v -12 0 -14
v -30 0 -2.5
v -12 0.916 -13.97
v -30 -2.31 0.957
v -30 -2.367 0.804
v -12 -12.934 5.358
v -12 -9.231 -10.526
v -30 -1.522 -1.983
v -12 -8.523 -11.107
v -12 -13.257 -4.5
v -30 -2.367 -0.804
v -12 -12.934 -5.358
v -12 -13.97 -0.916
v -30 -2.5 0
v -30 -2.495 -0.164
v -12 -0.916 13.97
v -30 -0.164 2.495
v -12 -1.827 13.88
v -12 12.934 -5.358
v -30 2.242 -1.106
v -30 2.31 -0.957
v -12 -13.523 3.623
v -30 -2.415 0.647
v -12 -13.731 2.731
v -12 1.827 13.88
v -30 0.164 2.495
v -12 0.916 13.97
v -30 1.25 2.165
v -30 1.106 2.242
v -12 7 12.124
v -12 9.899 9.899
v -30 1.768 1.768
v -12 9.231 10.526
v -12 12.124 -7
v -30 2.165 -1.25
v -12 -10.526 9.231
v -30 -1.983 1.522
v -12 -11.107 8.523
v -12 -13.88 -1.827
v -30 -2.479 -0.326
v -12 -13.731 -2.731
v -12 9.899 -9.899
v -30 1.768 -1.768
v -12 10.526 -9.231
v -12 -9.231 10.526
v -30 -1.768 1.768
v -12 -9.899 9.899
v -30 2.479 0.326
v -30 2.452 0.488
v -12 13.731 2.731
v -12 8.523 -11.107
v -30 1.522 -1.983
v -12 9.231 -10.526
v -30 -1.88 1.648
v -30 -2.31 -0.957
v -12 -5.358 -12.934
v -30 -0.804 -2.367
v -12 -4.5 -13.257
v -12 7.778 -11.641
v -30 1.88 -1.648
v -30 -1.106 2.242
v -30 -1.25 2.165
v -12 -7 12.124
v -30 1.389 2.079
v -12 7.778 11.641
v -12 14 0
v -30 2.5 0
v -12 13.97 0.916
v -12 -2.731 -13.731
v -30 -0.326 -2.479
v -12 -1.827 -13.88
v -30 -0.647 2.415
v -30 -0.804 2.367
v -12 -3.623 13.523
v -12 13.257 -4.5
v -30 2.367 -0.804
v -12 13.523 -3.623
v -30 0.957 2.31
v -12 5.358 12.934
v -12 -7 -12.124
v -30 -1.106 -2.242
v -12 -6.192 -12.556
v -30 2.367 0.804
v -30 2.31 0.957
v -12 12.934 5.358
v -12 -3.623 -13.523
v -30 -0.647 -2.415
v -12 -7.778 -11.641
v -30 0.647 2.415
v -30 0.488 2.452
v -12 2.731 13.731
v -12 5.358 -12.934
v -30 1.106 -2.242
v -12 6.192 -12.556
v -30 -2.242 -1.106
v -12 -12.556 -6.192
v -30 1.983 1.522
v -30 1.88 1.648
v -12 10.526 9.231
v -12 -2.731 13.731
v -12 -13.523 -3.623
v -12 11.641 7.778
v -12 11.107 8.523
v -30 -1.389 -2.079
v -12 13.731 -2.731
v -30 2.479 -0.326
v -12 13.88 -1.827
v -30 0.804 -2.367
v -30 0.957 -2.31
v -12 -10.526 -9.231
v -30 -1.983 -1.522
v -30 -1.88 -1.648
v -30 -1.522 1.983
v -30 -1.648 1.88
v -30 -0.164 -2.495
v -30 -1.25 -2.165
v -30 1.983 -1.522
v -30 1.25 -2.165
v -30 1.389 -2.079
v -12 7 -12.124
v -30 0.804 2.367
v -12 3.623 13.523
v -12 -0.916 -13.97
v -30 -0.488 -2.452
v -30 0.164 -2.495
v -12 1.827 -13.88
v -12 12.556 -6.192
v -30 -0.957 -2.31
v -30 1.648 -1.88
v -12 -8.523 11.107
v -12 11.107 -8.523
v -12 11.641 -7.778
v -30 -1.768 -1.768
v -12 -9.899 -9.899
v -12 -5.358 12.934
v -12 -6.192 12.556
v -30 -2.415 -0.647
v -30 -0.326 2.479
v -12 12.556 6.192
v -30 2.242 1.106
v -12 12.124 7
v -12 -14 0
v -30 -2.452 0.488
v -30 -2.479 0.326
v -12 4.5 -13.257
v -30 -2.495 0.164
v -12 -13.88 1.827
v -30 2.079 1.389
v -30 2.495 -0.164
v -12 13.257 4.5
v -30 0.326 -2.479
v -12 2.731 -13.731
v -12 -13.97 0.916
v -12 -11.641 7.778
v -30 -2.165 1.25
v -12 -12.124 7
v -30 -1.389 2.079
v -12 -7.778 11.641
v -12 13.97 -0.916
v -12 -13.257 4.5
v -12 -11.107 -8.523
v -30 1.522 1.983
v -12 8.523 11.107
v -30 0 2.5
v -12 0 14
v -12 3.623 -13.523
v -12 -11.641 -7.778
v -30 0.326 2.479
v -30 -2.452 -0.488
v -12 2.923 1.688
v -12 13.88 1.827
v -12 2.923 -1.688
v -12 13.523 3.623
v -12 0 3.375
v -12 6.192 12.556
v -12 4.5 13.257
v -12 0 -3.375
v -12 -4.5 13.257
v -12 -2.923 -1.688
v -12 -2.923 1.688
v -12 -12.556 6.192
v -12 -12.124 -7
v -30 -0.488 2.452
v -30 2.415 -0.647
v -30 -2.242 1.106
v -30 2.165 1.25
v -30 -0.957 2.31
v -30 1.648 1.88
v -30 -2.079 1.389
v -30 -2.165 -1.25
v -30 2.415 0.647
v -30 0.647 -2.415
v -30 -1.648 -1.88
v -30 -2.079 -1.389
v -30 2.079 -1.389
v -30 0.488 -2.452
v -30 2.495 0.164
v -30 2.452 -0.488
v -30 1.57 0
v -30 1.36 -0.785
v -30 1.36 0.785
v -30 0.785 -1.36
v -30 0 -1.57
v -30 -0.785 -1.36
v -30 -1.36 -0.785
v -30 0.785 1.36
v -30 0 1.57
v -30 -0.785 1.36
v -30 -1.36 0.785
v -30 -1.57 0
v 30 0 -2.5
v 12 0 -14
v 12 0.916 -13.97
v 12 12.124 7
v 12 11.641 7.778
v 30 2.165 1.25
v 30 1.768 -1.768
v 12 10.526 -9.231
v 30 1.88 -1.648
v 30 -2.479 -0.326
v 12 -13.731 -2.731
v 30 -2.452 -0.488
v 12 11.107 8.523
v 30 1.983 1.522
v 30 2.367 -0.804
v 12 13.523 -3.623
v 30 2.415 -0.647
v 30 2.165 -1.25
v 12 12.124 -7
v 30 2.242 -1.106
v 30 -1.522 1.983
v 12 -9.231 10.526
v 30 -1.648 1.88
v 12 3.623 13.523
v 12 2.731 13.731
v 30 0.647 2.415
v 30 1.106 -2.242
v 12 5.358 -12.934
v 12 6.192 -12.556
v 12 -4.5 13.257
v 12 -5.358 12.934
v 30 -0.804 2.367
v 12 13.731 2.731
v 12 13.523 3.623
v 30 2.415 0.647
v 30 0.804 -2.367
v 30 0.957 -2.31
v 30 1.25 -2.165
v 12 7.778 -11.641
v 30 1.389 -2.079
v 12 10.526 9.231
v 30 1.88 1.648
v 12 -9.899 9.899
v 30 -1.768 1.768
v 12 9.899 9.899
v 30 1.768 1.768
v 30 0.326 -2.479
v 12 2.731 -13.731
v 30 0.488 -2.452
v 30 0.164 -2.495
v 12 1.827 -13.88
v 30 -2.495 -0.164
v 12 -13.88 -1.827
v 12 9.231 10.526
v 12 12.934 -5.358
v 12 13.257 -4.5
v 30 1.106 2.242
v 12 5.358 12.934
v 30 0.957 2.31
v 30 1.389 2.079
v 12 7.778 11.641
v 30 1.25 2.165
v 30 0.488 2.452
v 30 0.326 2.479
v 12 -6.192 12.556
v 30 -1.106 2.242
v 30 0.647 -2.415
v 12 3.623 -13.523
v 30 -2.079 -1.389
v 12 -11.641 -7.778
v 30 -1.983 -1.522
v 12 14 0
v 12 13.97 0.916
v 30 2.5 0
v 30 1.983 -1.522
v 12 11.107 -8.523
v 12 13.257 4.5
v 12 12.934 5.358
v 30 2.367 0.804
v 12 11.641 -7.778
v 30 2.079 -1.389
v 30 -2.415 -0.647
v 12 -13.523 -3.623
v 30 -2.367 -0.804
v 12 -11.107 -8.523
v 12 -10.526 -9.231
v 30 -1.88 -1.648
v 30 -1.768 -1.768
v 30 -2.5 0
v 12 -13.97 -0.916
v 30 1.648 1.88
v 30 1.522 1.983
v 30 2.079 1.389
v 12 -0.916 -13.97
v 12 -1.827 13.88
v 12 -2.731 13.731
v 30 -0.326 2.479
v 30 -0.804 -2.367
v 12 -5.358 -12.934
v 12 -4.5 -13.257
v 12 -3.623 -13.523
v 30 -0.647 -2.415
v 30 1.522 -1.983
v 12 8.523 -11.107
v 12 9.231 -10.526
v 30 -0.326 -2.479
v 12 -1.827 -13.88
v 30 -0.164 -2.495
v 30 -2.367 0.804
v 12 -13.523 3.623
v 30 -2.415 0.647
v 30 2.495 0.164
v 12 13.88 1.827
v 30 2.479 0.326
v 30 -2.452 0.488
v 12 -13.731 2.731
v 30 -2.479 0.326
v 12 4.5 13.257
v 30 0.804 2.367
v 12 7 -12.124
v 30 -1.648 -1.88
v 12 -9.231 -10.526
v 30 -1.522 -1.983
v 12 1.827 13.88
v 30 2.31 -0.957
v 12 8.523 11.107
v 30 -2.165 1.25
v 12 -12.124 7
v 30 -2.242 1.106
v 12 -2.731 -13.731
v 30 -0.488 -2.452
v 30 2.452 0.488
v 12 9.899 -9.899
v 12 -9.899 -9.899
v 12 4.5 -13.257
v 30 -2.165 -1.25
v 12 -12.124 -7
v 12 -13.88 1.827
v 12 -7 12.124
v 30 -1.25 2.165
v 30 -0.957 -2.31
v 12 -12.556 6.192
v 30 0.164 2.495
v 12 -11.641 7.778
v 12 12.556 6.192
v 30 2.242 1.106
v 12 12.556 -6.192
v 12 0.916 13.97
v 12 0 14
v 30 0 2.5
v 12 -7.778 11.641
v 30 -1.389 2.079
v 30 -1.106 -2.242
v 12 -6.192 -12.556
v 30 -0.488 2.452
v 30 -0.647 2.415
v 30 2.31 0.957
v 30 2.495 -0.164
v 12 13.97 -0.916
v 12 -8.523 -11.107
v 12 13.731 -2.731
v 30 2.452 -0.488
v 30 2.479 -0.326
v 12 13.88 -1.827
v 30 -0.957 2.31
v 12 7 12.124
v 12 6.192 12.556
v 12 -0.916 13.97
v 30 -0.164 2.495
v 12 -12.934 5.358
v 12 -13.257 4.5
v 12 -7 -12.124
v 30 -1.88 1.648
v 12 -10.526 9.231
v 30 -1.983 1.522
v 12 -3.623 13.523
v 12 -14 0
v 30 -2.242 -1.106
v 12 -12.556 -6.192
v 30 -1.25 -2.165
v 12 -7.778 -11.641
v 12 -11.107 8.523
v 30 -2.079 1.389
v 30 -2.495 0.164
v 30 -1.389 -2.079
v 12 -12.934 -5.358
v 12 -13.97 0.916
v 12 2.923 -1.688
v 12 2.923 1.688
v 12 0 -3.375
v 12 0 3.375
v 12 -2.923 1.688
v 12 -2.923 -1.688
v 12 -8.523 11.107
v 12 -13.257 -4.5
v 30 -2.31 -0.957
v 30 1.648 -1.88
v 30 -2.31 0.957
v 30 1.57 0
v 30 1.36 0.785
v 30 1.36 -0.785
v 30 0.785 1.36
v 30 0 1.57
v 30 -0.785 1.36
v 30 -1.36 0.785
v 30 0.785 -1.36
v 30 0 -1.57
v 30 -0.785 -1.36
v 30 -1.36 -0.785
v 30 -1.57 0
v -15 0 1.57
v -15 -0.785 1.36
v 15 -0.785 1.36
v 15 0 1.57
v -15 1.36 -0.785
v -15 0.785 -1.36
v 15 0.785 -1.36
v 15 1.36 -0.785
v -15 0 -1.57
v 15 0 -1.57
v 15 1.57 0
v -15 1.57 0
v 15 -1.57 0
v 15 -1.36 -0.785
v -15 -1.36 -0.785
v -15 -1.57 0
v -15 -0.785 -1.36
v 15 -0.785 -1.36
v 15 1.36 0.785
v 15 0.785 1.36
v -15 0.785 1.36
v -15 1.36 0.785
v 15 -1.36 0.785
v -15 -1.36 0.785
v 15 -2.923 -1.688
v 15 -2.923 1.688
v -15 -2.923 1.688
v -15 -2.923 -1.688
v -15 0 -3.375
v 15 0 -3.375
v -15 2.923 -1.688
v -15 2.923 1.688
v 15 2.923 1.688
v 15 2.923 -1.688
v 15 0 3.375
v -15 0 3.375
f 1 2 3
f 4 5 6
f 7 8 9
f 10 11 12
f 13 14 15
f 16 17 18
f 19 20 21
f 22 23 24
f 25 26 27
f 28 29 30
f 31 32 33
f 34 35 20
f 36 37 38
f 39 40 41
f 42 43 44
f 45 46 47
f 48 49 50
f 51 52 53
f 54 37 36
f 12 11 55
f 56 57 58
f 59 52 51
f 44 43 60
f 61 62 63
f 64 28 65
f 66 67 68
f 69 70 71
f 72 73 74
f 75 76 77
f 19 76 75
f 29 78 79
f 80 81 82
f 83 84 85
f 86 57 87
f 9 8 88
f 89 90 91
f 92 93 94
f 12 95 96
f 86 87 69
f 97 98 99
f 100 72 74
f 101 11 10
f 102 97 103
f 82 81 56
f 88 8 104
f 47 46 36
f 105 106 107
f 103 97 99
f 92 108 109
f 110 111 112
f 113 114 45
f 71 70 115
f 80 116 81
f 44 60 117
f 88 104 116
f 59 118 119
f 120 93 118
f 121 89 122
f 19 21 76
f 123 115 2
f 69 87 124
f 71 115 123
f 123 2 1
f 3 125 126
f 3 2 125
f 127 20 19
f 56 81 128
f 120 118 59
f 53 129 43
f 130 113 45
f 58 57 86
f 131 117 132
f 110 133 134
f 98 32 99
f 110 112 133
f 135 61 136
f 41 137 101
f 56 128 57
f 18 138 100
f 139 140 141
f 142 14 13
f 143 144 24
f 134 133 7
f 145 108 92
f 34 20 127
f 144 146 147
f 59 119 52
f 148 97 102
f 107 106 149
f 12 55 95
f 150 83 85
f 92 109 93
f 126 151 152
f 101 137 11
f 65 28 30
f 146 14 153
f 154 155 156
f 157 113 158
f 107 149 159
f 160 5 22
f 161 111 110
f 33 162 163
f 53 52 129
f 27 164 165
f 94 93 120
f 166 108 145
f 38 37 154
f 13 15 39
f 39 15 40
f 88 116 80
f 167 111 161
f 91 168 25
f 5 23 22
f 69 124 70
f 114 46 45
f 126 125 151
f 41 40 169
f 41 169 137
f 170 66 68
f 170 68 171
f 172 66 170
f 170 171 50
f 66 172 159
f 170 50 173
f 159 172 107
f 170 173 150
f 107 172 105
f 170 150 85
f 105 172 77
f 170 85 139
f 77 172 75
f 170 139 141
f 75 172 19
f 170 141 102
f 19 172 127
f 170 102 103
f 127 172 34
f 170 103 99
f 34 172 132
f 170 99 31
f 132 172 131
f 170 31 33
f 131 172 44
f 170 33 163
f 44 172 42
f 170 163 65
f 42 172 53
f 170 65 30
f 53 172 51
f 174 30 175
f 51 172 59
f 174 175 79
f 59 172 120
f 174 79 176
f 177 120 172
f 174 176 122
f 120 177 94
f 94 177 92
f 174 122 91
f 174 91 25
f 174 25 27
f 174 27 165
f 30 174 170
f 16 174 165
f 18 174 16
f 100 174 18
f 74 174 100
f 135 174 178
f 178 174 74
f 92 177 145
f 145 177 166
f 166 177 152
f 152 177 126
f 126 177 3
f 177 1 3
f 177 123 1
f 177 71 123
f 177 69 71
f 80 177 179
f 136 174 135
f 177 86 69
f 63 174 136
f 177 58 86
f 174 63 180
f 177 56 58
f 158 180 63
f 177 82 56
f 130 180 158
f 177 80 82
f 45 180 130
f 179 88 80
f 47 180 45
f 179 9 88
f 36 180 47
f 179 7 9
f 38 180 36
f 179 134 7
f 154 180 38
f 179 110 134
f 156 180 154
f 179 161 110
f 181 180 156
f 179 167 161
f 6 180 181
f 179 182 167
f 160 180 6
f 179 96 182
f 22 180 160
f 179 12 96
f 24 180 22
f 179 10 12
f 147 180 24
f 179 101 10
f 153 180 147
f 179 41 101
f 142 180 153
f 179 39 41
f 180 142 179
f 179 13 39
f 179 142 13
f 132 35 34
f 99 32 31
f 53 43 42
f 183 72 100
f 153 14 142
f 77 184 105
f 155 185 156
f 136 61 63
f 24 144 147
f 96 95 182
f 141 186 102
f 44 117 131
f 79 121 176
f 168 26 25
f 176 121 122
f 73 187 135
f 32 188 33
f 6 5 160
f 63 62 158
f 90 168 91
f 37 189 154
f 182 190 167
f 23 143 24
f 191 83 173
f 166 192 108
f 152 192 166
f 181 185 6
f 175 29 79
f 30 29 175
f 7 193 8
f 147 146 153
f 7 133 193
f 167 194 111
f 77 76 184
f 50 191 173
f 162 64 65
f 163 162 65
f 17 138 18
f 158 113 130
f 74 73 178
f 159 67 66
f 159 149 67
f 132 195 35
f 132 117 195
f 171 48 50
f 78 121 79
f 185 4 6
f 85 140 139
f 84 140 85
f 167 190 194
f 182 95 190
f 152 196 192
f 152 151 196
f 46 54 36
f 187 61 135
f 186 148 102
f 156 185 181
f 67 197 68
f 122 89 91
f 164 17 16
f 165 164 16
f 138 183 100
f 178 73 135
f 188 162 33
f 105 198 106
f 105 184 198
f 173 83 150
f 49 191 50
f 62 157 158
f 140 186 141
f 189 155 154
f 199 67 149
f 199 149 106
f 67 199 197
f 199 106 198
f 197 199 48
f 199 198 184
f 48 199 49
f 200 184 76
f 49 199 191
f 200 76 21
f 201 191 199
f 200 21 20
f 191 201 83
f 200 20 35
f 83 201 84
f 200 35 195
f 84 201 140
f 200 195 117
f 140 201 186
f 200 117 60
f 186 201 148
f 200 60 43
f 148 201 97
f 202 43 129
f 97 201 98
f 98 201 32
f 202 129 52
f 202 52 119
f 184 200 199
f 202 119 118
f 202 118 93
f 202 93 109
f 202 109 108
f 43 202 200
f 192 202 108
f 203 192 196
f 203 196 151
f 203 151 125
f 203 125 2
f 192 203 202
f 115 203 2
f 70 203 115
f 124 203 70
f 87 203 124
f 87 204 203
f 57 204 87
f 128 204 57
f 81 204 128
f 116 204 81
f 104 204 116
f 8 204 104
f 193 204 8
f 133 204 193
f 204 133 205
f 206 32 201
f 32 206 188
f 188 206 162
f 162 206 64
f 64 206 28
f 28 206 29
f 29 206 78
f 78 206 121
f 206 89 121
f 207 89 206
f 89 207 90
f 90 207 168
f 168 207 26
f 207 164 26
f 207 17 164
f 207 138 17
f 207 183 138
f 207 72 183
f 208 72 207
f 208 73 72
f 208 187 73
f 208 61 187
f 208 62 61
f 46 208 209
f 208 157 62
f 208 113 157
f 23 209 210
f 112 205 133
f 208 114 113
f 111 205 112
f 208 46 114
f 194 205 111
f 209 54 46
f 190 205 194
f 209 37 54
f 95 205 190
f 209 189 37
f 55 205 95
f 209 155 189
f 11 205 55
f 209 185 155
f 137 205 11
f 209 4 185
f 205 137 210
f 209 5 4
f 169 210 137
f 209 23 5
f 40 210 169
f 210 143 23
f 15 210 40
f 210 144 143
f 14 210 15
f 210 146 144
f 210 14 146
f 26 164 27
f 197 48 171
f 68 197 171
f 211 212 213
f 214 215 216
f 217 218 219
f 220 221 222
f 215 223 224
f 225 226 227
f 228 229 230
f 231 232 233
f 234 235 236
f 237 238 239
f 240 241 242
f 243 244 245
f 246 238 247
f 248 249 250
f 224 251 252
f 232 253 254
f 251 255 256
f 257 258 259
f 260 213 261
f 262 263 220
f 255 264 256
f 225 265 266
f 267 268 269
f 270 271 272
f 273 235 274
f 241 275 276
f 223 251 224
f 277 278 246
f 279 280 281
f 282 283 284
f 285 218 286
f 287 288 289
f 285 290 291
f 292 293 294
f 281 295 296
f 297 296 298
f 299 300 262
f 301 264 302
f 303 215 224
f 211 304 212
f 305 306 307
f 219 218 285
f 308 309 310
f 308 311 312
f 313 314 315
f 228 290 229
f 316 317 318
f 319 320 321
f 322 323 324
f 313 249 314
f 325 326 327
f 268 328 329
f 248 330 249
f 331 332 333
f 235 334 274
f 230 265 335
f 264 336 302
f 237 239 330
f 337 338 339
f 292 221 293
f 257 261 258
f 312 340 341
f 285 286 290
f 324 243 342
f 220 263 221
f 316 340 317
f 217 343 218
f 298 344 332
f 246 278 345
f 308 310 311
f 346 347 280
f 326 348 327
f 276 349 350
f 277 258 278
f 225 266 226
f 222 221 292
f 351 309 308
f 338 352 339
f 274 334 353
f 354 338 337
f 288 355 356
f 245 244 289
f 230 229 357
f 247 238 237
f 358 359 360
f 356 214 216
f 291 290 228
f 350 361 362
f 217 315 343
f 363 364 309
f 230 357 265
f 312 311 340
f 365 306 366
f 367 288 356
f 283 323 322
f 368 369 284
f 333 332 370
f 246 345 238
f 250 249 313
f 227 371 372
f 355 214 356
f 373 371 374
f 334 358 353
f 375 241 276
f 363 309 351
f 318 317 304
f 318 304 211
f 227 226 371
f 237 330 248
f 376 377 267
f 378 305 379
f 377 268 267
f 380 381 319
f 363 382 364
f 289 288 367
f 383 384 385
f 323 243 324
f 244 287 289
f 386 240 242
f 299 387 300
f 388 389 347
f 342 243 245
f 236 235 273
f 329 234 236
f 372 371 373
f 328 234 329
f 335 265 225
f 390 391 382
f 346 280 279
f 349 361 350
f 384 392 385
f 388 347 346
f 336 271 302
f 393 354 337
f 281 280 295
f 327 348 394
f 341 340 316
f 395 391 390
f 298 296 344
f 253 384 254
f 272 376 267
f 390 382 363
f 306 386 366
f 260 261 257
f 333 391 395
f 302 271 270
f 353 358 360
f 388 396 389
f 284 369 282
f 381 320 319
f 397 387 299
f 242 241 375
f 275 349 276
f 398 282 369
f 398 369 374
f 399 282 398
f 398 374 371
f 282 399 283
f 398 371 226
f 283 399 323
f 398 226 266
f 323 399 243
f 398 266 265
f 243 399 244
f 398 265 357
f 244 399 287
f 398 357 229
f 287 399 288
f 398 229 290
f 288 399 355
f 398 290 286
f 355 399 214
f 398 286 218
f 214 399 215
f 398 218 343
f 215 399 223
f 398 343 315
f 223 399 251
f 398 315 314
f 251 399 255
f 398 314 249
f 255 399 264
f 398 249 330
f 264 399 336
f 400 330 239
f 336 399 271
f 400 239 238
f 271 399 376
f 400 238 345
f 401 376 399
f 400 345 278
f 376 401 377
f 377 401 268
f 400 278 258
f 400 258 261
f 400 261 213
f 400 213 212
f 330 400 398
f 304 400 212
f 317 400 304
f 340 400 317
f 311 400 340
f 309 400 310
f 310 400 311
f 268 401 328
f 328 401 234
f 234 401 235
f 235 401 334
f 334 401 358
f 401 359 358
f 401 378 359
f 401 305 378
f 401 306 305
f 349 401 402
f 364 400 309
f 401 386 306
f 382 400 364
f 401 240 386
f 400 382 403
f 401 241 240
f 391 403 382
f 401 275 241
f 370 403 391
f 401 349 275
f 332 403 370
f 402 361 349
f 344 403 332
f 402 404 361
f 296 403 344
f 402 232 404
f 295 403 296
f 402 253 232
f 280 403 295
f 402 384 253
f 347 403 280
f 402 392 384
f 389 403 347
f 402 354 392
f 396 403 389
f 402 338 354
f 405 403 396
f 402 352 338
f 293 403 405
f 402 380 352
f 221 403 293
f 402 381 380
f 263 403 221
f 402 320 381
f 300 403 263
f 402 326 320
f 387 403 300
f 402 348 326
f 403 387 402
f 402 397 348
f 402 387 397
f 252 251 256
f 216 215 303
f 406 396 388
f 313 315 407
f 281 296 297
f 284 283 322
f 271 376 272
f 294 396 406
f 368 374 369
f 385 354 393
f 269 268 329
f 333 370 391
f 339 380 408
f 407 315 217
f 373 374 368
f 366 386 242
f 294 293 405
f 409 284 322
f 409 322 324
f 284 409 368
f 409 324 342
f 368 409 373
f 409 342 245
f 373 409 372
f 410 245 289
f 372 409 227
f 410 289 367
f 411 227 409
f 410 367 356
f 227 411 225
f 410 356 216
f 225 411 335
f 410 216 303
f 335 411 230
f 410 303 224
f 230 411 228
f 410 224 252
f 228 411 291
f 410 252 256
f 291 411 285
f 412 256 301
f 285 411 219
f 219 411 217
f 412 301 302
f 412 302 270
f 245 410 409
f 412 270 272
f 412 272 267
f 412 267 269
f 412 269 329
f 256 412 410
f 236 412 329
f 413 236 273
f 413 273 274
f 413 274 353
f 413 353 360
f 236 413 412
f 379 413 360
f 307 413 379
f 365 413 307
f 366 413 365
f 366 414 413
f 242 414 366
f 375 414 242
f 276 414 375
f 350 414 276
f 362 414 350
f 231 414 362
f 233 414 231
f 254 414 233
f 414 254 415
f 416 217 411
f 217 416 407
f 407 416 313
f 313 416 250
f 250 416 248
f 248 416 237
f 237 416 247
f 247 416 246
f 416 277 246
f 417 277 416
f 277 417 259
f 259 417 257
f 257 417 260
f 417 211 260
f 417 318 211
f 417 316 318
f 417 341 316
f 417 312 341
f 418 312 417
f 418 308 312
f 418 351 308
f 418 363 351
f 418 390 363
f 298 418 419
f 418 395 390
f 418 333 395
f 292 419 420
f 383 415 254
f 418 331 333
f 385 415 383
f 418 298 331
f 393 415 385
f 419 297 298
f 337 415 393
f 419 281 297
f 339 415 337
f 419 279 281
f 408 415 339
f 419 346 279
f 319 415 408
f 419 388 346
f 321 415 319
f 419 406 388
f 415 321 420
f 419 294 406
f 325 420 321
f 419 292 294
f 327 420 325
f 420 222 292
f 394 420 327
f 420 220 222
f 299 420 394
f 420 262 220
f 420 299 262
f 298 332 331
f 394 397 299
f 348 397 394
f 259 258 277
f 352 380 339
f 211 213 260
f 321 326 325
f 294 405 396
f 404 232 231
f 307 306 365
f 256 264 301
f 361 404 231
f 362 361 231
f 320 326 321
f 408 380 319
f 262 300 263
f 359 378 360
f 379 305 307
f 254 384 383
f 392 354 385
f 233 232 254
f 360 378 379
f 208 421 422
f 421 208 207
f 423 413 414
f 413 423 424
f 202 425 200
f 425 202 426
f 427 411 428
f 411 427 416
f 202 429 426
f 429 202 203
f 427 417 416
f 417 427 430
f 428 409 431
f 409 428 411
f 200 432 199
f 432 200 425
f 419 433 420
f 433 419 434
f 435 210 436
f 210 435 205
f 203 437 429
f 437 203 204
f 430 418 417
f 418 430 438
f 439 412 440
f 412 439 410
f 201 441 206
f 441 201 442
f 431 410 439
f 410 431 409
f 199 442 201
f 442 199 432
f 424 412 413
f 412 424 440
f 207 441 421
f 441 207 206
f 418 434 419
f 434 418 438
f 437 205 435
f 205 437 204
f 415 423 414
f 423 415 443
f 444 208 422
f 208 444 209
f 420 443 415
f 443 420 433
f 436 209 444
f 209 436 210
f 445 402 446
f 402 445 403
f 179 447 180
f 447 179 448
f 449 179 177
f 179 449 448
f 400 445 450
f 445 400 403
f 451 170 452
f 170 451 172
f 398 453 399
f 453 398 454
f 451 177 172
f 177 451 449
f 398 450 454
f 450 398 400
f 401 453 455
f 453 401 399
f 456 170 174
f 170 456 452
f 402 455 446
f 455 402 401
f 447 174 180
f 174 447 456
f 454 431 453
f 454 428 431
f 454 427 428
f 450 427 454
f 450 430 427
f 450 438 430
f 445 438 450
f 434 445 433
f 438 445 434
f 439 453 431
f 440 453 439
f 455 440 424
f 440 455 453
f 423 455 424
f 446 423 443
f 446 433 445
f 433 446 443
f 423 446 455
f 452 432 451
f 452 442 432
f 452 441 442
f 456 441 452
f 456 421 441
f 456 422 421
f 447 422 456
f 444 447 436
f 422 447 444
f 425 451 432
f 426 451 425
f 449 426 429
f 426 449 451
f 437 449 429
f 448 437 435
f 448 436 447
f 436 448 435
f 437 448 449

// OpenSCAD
//include <configuration.scad>;

// parameters for rod mount horns.
// these parameters should be the same for the carriage horns.
separation = 40+10+10;  // Distance between ball joint mounting faces.
cone_r1 = 2.5;
cone_r2 = 14;//20;
cone_height=18;

module rodMountHorn(sep=separation, r1=cone_r1, r2=cone_r2, h=cone_height) {
  for (s = [-1, 1]) scale([s, 1, 1])
    translate([sep/2-9, 0, 0]) rotate([0, 90, 0])
      cylinder(r1=r2, r2=r1, h=h, center=true, $fn=96);
}

m3rad = 2.94/2;
m3nutRad = 5.5/cos(30)/2;

// boreLen is length of M3 bore before nut holder
module rodMountHornBore(fuzz=0.1,boreLen=15) {
  rotate([0,90,0]) {
    cylinder(r=m3rad+fuzz,h=separation+1,$fn=12,center=true);
    cylinder(r=m3nutRad+fuzz*2,h=separation-2*boreLen,$fn=6,center=true);
  }
}

difference() {
  rodMountHorn();
  #rodMountHornBore();
}
